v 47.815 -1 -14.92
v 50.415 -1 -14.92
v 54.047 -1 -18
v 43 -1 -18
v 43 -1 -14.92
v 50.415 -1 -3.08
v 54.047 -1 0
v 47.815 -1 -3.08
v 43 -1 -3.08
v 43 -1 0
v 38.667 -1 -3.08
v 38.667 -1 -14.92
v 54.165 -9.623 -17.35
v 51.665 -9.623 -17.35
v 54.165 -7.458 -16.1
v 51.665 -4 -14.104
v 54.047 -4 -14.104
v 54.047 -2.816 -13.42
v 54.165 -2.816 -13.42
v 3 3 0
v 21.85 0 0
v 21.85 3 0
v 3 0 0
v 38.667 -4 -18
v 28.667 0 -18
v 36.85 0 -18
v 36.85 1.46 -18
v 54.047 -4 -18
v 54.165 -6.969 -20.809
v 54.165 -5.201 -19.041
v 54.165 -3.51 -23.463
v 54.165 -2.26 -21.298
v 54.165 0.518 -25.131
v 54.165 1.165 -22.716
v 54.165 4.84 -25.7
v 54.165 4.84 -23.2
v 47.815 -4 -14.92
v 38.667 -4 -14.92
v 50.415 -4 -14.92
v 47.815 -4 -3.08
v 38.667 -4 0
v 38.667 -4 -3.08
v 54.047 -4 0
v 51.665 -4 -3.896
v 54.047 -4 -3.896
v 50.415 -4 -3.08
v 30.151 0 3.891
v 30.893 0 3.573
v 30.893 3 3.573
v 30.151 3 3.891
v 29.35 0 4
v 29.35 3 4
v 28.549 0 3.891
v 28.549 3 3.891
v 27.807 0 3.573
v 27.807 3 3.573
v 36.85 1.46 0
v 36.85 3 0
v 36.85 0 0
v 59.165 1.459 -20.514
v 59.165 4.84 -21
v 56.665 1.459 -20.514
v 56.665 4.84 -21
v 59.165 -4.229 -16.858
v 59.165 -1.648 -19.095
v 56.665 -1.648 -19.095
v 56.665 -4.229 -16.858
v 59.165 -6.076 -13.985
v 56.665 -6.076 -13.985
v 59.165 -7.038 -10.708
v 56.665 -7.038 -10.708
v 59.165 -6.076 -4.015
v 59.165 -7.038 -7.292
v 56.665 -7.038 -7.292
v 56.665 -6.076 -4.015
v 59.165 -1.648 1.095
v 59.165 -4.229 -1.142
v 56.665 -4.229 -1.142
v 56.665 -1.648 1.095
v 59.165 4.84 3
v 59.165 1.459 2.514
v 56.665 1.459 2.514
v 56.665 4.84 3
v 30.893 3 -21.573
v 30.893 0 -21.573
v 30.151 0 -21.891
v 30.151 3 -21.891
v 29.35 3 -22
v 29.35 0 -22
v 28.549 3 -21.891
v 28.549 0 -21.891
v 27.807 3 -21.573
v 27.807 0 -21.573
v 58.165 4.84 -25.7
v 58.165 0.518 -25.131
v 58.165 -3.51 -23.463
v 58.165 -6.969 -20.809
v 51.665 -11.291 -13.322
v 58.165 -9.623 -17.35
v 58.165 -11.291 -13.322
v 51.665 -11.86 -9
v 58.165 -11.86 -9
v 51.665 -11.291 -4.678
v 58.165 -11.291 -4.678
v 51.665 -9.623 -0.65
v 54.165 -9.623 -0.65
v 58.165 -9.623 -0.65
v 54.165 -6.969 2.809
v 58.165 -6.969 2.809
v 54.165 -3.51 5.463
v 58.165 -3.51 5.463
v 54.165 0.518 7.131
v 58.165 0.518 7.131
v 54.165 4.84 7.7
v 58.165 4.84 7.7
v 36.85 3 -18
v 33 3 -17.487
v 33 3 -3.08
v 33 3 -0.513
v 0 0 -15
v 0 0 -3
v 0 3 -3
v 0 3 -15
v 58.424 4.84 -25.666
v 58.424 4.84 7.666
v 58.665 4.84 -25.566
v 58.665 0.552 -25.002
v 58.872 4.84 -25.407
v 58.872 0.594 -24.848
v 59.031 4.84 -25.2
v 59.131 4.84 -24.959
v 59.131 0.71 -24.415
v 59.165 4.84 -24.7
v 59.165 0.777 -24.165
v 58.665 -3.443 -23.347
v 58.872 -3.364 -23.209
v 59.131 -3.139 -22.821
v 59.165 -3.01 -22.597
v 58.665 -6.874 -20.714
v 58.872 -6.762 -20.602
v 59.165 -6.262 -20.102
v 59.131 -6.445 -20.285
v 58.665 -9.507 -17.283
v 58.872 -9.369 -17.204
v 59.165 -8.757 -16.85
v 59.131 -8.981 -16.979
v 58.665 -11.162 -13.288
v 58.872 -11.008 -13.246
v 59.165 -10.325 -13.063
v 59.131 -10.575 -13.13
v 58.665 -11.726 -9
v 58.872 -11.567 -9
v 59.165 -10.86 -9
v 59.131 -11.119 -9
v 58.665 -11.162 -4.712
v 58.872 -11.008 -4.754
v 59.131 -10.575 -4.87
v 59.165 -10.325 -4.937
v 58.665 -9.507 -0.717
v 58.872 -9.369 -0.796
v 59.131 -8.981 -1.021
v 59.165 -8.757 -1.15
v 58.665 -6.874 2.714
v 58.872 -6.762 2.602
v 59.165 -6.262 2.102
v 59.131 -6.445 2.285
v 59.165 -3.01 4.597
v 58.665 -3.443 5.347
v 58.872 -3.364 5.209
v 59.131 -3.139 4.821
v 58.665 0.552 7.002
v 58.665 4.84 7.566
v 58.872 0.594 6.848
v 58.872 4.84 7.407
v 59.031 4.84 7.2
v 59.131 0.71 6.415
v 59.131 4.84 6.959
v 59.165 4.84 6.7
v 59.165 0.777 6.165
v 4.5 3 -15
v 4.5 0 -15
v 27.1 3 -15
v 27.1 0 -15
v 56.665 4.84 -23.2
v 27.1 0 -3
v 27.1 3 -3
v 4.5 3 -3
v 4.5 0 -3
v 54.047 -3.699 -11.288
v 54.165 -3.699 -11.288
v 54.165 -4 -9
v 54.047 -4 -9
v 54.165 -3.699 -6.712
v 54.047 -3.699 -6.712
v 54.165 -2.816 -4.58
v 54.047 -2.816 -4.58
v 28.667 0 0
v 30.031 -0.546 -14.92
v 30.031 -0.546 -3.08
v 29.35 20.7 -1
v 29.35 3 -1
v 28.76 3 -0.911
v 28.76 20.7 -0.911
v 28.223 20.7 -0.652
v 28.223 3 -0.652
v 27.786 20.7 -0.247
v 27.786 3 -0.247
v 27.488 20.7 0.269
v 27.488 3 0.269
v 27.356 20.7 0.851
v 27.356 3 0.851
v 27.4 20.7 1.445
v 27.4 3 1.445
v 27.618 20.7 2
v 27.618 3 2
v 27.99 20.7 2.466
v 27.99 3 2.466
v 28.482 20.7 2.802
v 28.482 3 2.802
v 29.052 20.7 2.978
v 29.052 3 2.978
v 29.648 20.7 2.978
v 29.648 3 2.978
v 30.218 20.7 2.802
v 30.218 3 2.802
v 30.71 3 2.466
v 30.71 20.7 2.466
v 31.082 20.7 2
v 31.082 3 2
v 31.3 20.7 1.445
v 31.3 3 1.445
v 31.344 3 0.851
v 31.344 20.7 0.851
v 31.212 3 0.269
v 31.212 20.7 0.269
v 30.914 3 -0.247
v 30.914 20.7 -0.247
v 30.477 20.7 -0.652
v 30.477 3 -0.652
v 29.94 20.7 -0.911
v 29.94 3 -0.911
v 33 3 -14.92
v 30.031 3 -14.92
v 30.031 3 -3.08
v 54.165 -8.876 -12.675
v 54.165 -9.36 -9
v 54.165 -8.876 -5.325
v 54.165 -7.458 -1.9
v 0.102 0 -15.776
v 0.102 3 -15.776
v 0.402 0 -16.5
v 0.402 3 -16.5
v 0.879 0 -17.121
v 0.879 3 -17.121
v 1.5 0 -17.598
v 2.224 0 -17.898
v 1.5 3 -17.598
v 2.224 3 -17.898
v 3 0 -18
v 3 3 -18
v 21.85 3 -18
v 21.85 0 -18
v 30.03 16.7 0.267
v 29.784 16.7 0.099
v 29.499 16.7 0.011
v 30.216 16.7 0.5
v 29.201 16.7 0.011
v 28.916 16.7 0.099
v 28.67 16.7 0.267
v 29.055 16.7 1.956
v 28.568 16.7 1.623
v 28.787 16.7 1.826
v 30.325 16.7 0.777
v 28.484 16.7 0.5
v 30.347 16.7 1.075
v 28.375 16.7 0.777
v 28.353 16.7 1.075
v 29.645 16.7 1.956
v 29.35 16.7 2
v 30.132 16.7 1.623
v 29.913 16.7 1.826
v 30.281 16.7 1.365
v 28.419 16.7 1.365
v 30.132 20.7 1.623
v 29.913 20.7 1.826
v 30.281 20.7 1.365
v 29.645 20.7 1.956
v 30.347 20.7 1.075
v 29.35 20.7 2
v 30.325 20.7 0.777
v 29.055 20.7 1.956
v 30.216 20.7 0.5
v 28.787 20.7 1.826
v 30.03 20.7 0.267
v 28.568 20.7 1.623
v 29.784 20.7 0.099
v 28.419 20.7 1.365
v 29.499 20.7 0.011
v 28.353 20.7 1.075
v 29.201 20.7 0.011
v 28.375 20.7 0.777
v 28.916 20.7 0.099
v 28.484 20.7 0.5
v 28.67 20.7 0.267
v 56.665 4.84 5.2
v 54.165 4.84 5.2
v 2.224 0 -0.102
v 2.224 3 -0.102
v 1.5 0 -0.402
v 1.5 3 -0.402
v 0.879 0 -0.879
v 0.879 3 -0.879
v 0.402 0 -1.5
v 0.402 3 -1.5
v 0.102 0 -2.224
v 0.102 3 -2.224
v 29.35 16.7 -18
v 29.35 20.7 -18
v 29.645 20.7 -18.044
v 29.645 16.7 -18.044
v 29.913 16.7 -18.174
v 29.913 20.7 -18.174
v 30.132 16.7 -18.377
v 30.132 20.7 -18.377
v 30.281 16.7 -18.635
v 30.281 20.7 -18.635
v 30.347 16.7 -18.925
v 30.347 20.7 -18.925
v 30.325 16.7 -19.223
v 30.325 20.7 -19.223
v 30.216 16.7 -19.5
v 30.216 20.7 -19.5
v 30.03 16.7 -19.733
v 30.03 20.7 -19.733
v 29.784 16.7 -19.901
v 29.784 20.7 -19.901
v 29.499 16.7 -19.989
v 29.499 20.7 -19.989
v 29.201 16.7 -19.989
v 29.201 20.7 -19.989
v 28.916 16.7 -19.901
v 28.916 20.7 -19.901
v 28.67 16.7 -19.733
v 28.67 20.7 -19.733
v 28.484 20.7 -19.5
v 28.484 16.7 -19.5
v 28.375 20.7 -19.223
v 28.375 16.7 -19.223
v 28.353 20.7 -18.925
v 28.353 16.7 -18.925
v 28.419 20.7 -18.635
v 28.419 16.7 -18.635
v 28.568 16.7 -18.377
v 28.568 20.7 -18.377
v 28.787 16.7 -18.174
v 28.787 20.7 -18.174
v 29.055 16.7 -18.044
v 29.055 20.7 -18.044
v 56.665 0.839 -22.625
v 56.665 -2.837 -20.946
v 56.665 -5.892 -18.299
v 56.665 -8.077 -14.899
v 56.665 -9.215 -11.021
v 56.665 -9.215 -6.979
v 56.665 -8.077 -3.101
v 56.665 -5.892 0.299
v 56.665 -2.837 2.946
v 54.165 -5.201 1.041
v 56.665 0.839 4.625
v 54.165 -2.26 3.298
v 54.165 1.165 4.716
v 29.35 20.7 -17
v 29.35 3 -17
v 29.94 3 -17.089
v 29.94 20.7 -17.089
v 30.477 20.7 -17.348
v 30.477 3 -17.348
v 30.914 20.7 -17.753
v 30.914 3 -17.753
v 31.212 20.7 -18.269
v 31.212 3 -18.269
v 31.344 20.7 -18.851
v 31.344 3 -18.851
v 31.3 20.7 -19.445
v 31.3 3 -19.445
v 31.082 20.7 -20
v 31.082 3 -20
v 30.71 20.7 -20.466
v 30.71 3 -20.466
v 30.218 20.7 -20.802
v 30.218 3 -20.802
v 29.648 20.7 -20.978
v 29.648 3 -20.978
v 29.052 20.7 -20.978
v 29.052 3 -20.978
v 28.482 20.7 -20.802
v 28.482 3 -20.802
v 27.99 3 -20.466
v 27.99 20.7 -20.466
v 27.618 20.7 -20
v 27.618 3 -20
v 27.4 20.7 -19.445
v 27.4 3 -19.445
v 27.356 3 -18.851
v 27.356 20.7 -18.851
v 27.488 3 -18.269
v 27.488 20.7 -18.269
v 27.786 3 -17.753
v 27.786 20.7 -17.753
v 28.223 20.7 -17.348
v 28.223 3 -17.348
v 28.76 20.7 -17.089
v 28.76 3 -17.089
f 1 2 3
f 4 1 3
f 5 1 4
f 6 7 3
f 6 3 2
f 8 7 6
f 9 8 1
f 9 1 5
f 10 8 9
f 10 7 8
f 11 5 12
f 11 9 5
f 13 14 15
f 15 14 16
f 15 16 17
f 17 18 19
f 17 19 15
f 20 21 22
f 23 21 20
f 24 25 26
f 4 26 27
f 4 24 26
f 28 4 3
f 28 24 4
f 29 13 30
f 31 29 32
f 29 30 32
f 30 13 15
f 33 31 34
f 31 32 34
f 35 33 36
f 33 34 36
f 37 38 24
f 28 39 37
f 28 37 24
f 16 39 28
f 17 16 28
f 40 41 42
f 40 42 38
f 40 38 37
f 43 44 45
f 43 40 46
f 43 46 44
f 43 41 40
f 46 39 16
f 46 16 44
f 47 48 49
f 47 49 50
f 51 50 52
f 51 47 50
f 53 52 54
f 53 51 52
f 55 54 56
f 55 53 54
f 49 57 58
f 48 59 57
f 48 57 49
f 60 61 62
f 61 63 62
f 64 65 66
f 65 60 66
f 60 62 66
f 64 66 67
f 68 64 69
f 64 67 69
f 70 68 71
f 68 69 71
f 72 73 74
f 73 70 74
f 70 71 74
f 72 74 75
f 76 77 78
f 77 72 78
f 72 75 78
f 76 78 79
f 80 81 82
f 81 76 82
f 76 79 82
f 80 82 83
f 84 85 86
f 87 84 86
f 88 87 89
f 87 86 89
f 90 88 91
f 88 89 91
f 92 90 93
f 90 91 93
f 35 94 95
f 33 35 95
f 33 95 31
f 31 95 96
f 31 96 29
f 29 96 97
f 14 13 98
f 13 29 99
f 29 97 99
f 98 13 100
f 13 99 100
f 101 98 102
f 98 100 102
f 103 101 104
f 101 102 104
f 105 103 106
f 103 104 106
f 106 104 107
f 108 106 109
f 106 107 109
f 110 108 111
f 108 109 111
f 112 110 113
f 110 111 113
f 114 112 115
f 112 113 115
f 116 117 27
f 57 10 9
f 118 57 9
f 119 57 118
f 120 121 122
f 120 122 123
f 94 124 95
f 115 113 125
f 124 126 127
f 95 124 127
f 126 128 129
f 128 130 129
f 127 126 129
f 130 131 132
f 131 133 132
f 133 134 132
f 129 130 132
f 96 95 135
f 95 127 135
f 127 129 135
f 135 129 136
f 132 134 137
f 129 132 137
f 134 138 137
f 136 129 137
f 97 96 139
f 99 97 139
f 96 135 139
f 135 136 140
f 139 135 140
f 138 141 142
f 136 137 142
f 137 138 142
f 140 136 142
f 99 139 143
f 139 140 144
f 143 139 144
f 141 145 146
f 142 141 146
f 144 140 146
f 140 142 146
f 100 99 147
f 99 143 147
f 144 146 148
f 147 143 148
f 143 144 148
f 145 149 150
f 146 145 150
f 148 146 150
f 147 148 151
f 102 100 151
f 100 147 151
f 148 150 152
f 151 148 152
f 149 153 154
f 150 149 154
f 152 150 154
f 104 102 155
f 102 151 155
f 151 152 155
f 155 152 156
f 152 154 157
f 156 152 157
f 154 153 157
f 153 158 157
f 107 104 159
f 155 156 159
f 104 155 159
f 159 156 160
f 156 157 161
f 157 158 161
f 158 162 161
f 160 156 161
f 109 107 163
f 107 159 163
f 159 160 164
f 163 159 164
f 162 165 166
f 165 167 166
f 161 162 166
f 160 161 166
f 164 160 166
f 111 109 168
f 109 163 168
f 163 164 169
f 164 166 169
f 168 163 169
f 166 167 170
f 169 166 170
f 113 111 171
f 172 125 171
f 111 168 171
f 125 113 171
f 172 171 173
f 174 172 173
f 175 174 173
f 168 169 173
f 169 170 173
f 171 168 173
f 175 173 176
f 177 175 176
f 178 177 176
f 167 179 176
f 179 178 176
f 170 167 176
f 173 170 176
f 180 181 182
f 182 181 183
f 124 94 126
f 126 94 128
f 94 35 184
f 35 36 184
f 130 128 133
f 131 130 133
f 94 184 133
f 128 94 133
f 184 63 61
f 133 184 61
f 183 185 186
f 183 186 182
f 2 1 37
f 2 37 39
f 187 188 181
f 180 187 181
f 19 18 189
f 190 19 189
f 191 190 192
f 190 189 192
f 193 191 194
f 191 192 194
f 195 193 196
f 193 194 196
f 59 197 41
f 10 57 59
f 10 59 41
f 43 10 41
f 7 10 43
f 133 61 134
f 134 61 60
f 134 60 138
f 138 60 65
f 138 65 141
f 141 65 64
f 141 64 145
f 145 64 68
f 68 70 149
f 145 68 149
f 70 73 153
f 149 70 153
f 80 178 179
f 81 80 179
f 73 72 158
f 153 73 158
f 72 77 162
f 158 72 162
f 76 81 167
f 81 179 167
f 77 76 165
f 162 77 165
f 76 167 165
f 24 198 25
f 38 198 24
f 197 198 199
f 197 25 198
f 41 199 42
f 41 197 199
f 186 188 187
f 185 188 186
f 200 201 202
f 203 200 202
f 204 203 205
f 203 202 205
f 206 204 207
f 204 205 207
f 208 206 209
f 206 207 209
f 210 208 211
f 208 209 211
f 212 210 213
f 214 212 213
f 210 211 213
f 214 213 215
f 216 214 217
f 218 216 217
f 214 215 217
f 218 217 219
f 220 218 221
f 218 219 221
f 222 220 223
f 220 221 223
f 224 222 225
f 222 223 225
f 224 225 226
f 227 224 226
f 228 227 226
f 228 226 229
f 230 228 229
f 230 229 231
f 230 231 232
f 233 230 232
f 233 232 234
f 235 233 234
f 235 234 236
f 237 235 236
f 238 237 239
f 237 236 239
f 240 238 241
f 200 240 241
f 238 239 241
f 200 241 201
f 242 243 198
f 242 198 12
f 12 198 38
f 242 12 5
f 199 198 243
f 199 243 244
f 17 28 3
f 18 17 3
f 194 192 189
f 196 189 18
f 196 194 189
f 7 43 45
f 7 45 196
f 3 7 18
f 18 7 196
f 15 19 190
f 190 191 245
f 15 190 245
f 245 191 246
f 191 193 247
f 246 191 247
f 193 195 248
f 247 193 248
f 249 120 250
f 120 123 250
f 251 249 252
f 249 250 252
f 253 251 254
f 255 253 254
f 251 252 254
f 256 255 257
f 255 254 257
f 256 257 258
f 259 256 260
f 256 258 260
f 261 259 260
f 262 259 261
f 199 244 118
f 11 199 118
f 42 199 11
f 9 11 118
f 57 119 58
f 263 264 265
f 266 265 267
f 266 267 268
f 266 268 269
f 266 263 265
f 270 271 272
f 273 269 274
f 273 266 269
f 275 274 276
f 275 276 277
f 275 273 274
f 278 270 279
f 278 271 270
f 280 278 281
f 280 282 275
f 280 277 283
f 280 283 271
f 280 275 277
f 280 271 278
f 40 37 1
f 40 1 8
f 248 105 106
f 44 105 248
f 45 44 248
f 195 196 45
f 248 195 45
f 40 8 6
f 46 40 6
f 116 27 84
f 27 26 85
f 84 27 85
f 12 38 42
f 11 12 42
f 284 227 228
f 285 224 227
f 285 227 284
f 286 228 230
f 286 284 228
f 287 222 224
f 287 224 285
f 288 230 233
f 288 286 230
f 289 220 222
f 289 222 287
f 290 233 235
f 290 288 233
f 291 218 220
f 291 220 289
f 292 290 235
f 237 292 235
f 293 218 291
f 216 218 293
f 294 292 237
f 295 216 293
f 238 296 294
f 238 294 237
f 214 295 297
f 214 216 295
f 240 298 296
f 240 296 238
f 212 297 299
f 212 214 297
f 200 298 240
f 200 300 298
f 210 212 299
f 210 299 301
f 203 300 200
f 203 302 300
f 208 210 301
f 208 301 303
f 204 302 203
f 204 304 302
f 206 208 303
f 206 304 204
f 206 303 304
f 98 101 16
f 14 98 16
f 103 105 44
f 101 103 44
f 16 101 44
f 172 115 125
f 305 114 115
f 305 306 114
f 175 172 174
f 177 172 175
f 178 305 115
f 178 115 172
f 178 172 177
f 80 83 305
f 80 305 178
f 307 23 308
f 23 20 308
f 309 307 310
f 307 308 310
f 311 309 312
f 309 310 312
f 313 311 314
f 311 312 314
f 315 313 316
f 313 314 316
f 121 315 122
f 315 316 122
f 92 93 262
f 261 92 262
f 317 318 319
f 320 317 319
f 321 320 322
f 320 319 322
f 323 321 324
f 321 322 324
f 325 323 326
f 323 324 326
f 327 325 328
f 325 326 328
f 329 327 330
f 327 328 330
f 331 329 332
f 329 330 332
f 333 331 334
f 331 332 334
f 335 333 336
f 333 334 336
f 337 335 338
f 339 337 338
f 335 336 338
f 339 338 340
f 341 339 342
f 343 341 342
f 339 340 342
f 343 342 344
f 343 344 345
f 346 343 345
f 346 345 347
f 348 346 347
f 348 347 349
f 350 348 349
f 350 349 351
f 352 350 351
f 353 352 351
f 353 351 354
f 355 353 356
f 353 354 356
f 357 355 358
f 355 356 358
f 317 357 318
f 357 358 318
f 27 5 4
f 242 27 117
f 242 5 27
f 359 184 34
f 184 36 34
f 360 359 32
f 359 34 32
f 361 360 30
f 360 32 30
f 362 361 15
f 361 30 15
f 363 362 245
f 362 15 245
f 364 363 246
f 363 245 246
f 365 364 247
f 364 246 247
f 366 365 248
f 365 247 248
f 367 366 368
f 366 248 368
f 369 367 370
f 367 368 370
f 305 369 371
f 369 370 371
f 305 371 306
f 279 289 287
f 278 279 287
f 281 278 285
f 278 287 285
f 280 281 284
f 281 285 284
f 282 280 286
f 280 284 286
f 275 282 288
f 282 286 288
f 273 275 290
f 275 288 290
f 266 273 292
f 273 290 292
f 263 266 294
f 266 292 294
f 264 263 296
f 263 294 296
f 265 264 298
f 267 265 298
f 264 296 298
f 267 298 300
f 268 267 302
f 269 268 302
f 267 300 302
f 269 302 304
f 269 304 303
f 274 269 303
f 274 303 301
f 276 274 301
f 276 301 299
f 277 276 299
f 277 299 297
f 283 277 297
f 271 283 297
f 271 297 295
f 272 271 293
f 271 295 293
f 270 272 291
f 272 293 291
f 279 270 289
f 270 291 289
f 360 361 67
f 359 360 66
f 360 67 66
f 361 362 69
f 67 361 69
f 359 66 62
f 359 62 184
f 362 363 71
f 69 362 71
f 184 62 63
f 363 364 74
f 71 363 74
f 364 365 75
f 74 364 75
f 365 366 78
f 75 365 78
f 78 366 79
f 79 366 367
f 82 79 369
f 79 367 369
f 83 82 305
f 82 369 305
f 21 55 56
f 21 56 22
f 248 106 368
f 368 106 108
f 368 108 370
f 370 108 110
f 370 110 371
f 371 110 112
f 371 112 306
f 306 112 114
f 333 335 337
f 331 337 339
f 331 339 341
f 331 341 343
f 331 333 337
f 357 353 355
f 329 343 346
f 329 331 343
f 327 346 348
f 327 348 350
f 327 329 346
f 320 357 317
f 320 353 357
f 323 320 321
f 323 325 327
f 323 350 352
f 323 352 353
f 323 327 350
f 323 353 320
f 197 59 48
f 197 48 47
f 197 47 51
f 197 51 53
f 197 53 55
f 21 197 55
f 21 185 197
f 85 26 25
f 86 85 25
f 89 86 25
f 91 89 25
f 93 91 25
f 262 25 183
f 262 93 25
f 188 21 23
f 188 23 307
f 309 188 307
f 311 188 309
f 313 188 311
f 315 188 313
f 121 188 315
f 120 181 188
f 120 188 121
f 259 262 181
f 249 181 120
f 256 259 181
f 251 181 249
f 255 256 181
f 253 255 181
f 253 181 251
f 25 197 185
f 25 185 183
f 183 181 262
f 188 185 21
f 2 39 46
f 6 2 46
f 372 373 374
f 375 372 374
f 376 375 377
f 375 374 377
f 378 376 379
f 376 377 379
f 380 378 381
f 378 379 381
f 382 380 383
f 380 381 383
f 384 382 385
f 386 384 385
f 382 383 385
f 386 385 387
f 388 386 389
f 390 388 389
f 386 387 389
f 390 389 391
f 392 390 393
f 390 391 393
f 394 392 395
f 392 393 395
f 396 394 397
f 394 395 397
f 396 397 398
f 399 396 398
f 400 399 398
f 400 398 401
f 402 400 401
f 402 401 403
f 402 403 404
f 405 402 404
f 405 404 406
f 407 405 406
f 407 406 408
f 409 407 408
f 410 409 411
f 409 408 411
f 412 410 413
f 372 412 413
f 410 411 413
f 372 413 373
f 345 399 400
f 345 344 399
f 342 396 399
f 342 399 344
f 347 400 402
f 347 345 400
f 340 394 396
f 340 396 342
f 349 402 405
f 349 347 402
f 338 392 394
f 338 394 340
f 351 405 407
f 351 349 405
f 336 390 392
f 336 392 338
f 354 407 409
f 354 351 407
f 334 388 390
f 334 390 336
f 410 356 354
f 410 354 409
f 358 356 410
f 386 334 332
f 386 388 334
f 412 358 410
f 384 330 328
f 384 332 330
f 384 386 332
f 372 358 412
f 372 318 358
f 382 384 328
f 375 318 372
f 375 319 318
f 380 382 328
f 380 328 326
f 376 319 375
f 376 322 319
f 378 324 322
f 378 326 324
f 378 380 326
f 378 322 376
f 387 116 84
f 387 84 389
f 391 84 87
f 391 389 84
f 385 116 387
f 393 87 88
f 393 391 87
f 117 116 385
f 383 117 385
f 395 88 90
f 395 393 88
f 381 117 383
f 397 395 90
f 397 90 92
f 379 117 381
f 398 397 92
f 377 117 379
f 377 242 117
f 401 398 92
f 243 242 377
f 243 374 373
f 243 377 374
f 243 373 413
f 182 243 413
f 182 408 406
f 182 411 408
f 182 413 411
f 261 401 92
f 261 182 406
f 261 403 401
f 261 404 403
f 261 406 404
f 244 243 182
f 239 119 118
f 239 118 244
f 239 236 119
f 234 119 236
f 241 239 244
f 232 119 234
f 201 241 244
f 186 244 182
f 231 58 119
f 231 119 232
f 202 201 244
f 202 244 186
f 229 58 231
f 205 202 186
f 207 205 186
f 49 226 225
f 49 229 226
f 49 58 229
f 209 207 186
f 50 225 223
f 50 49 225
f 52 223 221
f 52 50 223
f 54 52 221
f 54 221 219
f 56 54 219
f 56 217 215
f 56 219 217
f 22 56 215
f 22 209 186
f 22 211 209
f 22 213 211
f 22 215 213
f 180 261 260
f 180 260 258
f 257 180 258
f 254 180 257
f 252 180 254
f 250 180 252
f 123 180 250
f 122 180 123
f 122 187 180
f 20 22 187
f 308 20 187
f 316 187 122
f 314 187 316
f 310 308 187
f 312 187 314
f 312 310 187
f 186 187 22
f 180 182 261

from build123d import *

# Parameters (mm, degrees)
SKETCH1_W                   = 22.6
SKETCH1_H                   = 12
BOSS_EXTRUDE1_DEPTH         = 3
BOSS_EXTRU_2_DEPTH          = 3
BOSS_EXTRU_1_REACH          = 45.022
ESQUISSE3_W                 = 8.636214684
ESQUISSE3_H                 = 11.84
ESQUISSE3_W_2               = 2.6
ENL_V_MAT_EXTRU_1_DEPTH     = 59.77153097
ESQUISSE6_R                 = 2
BOSS_EXTRU_3_DEPTH          = 17.7
ESQUISSE7_R                 = 1
ENL_V_MAT_EXTRU_3_DEPTH     = 4
R_VOLUTION1_ANGLE           = 90
R_VOLUTION1_OTHER_WAY_ANGLE = 90
REVOLVE1_ANGLE              = 30
REVOLVE1_OTHER_WAY_ANGLE    = 30
CONG_1_R                    = 3
CONG_2_R                    = 1
SKETCH3_W                   = 12.969079214
SKETCH3_H                   = 8.353445093
CUT_EXTRUDE1_DEPTH          = 11.84


with BuildPart() as part:
    # Sketch1 → Boss-Extrude1 (new body)
    with BuildSketch(Plane(origin=(0, 0, 0), x_dir=(1, 0, 0), z_dir=(0, 1, 0))):
        Polygon((33, 3), (33, 0), (0, 0), (0, 18), (33, 18), (33, 15), (31.6, 15), (31.6, 3), align=None)
        with Locations((15.8, 9)):
            Rectangle(SKETCH1_W, SKETCH1_H, mode=Mode.SUBTRACT)
    extrude(amount=BOSS_EXTRUDE1_DEPTH)

    # Esquisse4 → Boss.-Extru.2 (add)
    with BuildSketch(Plane.XZ):
        with BuildLine():
            Line((29.35, -17), (36.85, -18))
            Line((36.85, -18), (30.893033467, -21.572751002))
            ThreePointArc((30.893033467, -21.572751002), (29.35, -22), (27.806966533, -21.572751002))
            Line((27.806966533, -21.572751002), (21.85, -18))
            Line((21.85, -18), (29.35, -17))
        make_face()
        with BuildLine():
            Line((36.85, 0), (30.893033467, 3.572751002))
            ThreePointArc((30.893033467, 3.572751002), (29.35, 4), (27.806966533, 3.572751002))
            Line((27.806966533, 3.572751002), (21.85, 0))
            Line((21.85, 0), (29.35, -1))
            Line((29.35, -1), (36.85, 0))
        make_face()
    extrude(amount=-BOSS_EXTRU_2_DEPTH)

    # Boss.-Extru.1: up to this face of the body (flat: up to its plane)
    boss_extru_1_end = Plane(part.part.faces().sort_by_distance((10.925, 1.5, -18))[0])
    # Esquisse1 → Boss.-Extru.1 (add, up to the picked face)
    with BuildSketch(Plane.XY, mode=Mode.PRIVATE) as boss_extru_1_sk1:
        Polygon((43, -1), (33, 3), (28.66713547, 3), (28.66713547, 0), (38.66713547, -4), (54.04713547, -4), (54.04713547, -1), align=None)
    boss_extru_1_tool1 = split(extrude(boss_extru_1_sk1.sketch, amount=-BOSS_EXTRU_1_REACH, mode=Mode.PRIVATE), bisect_by=boss_extru_1_end, keep=Keep.BOTH, mode=Mode.PRIVATE)
    add(boss_extru_1_tool1.solids().sort_by(Axis((40.332957, -1.209124, 0), (0, 0, -1)))[0])

    # Esquisse3 → Enlèv. mat.-Extru.1 (cut, through all)
    with BuildSketch(Plane.XZ.offset(4)):
        with Locations((34.349028128, -9)):
            Rectangle(ESQUISSE3_W, ESQUISSE3_H)
        with Locations((49.115, -9)):
            Rectangle(ESQUISSE3_W_2, ESQUISSE3_H)
    extrude(amount=-ENL_V_MAT_EXTRU_1_DEPTH, mode=Mode.SUBTRACT)

    # Esquisse6 → Boss.-Extru.3 (add)
    with BuildSketch(Plane(origin=(0, 3, 0), x_dir=(1, 0, 0), z_dir=(0, 1, 0))):
        with Locations(Location((29.35, -1, 0), (0, 0, 90))):
            Circle(ESQUISSE6_R)
        with Locations(Location((29.35, 19, 0), (0, 0, 270))):
            Circle(ESQUISSE6_R)
    extrude(amount=BOSS_EXTRU_3_DEPTH)

    # Esquisse7 → Enlèv. mat.-Extru.3 (cut)
    with BuildSketch(Plane(origin=(0, 20.7, 0), x_dir=(1, 0, 0), z_dir=(0, 1, 0))):
        with Locations(Location((29.35, 19, 0), (0, 0, 270))):
            Circle(ESQUISSE7_R)
        with Locations(Location((29.35, -1, 0), (0, 0, 270))):
            Circle(ESQUISSE7_R)
    extrude(amount=-ENL_V_MAT_EXTRU_3_DEPTH, mode=Mode.SUBTRACT)



with BuildPart() as body_2:
    # Esquisse8 → Révolution1 (revolve)
    with BuildSketch(Plane.XY.offset(-9)):
        Polygon((56.665, -9.36), (54.165, -9.36), (54.165, -11.86), (59.165, -11.86), (59.165, -7.16), (56.665, -7.16), align=None)
    revolve(axis=Axis((74.438744763, 4.84, -9), (1, 0, 0)), revolution_arc=R_VOLUTION1_ANGLE)

    # Esquisse8 → Révolution1 other way (revolve)
    with BuildSketch(Plane.XY.offset(-9)):
        Polygon((56.665, -9.36), (54.165, -9.36), (54.165, -11.86), (59.165, -11.86), (59.165, -7.16), (56.665, -7.16), align=None)
    revolve(axis=Axis((74.438744763, 4.84, -9), (-1, 0, 0)), revolution_arc=R_VOLUTION1_OTHER_WAY_ANGLE)


with BuildPart() as part_1:
    add(part.part)

    add(body_2.part)  # Revolve1 merges body 2
    # Esquisse8<5> → Revolve1 (revolve)
    with BuildSketch(Plane.XY.offset(-9)):
        Polygon((54.165, -11.86), (54.165, -9.36), (54.165, -4), (51.665, -4), (51.665, -11.86), align=None)
    revolve(axis=Axis((74.438744763, 4.84, -9), (1, 0, 0)), revolution_arc=REVOLVE1_ANGLE)

    # Esquisse8<5> → Revolve1 other way (revolve)
    with BuildSketch(Plane.XY.offset(-9)):
        Polygon((54.165, -11.86), (54.165, -9.36), (54.165, -4), (51.665, -4), (51.665, -11.86), align=None)
    revolve(axis=Axis((74.438744763, 4.84, -9), (-1, 0, 0)), revolution_arc=REVOLVE1_OTHER_WAY_ANGLE)

    # Congé1
    cong_1_edges = [part_1.edges().sort_by_distance(p)[0] for p in [
        (0, 1.5, -18),
        (0, 1.5, 0),
    ]]
    fillet(cong_1_edges, radius=CONG_1_R)

    # Congé2
    cong_2_edges = [part_1.edges().sort_by_distance(p)[0] for p in [
        (59.165, -11.86, -9),
    ]]
    fillet(cong_2_edges, radius=CONG_2_R)

    # Sketch3 → Cut-Extrude1 (cut)
    with BuildSketch(Plane.XY.offset(-14.92)):
        with Locations((36.515460393, 3.176722547)):
            Rectangle(SKETCH3_W, SKETCH3_H)
    extrude(amount=CUT_EXTRUDE1_DEPTH, mode=Mode.SUBTRACT)


solid = part_1.part
